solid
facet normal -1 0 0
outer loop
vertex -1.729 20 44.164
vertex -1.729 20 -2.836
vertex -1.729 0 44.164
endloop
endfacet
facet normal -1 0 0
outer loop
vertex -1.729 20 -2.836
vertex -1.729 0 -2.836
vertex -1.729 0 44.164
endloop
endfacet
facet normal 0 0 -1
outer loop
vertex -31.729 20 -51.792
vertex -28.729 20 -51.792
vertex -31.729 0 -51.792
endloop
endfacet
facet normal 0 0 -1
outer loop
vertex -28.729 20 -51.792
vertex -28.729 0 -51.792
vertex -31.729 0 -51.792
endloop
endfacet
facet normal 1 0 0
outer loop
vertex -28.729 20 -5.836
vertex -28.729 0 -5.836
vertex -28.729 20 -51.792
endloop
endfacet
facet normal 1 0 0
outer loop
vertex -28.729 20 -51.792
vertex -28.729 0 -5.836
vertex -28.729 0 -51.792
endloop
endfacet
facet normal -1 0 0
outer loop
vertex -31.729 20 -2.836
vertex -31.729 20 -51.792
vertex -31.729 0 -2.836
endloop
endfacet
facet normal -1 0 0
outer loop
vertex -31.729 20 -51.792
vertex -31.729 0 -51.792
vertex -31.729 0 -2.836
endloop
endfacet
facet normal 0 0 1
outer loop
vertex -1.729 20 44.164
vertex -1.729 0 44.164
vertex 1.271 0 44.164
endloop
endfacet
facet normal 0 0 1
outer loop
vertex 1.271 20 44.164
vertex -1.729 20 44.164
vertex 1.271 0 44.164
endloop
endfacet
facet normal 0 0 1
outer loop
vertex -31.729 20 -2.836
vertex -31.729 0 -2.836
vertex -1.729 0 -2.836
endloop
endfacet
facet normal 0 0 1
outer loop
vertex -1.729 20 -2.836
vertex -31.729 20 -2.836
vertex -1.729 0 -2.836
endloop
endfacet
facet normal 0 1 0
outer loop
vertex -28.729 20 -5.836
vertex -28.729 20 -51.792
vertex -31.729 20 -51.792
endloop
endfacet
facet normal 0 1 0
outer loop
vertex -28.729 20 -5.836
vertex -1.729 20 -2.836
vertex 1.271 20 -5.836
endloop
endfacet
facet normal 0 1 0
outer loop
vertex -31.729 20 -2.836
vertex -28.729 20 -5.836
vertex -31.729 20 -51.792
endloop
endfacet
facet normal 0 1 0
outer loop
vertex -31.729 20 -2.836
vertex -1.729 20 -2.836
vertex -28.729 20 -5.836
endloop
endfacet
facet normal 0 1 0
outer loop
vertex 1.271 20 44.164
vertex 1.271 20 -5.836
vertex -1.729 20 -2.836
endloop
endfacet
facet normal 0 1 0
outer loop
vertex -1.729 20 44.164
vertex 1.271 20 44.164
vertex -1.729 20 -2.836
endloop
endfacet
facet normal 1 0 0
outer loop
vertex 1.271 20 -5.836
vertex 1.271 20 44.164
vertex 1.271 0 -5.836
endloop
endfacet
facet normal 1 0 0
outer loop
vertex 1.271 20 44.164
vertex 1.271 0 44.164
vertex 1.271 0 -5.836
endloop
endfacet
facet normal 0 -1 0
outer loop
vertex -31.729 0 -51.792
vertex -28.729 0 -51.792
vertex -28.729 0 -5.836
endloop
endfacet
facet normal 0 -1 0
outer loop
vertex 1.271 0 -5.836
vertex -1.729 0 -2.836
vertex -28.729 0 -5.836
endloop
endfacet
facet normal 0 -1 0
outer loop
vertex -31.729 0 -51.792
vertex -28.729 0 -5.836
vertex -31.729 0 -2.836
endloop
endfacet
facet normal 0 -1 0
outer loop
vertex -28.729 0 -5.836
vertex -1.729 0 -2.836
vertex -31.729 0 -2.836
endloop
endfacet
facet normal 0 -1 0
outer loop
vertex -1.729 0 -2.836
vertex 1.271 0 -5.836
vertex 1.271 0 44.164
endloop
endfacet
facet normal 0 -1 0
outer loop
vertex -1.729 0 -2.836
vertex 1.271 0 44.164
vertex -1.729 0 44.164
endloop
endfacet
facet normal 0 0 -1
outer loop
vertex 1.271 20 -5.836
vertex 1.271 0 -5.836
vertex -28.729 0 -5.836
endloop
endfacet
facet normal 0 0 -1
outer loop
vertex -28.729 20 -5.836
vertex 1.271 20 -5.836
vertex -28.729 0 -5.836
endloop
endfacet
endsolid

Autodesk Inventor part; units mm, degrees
ref_plane "YZ Plane" through (0, 0, 0) normal (1, 0, 0) x (0, 1, 0)
ref_plane "XZ Plane" through (0, 0, 0) normal (0, 1, 0) x (-1, 0, 0)
ref_plane "XY Plane" through (0, 0, 0) normal (0, 0, 1) x (1, 0, 0)
sketch "スケッチ1" plane through (0, 0, 0) normal (0, 1, 0) x (-1, 0, 0)
  line L0 (1.7293, 44.1636) -> (-1.2707, 44.1636)
  line L1 (-1.2707, 44.1636) -> (-1.2707, -5.8364)
  line L2 (-1.2707, -5.8364) -> (1.7293, -5.8364)
  line L3 (1.7293, -5.8364) -> (1.7293, 44.1636)
  line L4 (31.7293, -2.8364) -> (1.7293, -2.8364)
  line L5 (1.7293, -2.8364) -> (1.7293, -5.8364)
  line L6 (1.7293, -5.8364) -> (31.7293, -5.8364)
  line L7 (31.7293, -5.8364) -> (31.7293, -2.8364)
  line L8 (31.7293, -5.8364) -> (28.7293, -5.8364)
  line L9 (28.7293, -5.8364) -> (28.7293, -51.7922)
  line L10 (28.7293, -51.7922) -> (31.7293, -51.7922)
  line L11 (31.7293, -51.7922) -> (31.7293, -5.8364)
  point P0 (0, 0)
  dimension "d0" = 3
  dimension "d1" = 50
  dimension "d2" = 30
  dimension "d3" = 3
  dimension "d4" = 3
extrude "押し出し1" add sketch "スケッチ1" along normal blind 20
properties part number "recreat1"
